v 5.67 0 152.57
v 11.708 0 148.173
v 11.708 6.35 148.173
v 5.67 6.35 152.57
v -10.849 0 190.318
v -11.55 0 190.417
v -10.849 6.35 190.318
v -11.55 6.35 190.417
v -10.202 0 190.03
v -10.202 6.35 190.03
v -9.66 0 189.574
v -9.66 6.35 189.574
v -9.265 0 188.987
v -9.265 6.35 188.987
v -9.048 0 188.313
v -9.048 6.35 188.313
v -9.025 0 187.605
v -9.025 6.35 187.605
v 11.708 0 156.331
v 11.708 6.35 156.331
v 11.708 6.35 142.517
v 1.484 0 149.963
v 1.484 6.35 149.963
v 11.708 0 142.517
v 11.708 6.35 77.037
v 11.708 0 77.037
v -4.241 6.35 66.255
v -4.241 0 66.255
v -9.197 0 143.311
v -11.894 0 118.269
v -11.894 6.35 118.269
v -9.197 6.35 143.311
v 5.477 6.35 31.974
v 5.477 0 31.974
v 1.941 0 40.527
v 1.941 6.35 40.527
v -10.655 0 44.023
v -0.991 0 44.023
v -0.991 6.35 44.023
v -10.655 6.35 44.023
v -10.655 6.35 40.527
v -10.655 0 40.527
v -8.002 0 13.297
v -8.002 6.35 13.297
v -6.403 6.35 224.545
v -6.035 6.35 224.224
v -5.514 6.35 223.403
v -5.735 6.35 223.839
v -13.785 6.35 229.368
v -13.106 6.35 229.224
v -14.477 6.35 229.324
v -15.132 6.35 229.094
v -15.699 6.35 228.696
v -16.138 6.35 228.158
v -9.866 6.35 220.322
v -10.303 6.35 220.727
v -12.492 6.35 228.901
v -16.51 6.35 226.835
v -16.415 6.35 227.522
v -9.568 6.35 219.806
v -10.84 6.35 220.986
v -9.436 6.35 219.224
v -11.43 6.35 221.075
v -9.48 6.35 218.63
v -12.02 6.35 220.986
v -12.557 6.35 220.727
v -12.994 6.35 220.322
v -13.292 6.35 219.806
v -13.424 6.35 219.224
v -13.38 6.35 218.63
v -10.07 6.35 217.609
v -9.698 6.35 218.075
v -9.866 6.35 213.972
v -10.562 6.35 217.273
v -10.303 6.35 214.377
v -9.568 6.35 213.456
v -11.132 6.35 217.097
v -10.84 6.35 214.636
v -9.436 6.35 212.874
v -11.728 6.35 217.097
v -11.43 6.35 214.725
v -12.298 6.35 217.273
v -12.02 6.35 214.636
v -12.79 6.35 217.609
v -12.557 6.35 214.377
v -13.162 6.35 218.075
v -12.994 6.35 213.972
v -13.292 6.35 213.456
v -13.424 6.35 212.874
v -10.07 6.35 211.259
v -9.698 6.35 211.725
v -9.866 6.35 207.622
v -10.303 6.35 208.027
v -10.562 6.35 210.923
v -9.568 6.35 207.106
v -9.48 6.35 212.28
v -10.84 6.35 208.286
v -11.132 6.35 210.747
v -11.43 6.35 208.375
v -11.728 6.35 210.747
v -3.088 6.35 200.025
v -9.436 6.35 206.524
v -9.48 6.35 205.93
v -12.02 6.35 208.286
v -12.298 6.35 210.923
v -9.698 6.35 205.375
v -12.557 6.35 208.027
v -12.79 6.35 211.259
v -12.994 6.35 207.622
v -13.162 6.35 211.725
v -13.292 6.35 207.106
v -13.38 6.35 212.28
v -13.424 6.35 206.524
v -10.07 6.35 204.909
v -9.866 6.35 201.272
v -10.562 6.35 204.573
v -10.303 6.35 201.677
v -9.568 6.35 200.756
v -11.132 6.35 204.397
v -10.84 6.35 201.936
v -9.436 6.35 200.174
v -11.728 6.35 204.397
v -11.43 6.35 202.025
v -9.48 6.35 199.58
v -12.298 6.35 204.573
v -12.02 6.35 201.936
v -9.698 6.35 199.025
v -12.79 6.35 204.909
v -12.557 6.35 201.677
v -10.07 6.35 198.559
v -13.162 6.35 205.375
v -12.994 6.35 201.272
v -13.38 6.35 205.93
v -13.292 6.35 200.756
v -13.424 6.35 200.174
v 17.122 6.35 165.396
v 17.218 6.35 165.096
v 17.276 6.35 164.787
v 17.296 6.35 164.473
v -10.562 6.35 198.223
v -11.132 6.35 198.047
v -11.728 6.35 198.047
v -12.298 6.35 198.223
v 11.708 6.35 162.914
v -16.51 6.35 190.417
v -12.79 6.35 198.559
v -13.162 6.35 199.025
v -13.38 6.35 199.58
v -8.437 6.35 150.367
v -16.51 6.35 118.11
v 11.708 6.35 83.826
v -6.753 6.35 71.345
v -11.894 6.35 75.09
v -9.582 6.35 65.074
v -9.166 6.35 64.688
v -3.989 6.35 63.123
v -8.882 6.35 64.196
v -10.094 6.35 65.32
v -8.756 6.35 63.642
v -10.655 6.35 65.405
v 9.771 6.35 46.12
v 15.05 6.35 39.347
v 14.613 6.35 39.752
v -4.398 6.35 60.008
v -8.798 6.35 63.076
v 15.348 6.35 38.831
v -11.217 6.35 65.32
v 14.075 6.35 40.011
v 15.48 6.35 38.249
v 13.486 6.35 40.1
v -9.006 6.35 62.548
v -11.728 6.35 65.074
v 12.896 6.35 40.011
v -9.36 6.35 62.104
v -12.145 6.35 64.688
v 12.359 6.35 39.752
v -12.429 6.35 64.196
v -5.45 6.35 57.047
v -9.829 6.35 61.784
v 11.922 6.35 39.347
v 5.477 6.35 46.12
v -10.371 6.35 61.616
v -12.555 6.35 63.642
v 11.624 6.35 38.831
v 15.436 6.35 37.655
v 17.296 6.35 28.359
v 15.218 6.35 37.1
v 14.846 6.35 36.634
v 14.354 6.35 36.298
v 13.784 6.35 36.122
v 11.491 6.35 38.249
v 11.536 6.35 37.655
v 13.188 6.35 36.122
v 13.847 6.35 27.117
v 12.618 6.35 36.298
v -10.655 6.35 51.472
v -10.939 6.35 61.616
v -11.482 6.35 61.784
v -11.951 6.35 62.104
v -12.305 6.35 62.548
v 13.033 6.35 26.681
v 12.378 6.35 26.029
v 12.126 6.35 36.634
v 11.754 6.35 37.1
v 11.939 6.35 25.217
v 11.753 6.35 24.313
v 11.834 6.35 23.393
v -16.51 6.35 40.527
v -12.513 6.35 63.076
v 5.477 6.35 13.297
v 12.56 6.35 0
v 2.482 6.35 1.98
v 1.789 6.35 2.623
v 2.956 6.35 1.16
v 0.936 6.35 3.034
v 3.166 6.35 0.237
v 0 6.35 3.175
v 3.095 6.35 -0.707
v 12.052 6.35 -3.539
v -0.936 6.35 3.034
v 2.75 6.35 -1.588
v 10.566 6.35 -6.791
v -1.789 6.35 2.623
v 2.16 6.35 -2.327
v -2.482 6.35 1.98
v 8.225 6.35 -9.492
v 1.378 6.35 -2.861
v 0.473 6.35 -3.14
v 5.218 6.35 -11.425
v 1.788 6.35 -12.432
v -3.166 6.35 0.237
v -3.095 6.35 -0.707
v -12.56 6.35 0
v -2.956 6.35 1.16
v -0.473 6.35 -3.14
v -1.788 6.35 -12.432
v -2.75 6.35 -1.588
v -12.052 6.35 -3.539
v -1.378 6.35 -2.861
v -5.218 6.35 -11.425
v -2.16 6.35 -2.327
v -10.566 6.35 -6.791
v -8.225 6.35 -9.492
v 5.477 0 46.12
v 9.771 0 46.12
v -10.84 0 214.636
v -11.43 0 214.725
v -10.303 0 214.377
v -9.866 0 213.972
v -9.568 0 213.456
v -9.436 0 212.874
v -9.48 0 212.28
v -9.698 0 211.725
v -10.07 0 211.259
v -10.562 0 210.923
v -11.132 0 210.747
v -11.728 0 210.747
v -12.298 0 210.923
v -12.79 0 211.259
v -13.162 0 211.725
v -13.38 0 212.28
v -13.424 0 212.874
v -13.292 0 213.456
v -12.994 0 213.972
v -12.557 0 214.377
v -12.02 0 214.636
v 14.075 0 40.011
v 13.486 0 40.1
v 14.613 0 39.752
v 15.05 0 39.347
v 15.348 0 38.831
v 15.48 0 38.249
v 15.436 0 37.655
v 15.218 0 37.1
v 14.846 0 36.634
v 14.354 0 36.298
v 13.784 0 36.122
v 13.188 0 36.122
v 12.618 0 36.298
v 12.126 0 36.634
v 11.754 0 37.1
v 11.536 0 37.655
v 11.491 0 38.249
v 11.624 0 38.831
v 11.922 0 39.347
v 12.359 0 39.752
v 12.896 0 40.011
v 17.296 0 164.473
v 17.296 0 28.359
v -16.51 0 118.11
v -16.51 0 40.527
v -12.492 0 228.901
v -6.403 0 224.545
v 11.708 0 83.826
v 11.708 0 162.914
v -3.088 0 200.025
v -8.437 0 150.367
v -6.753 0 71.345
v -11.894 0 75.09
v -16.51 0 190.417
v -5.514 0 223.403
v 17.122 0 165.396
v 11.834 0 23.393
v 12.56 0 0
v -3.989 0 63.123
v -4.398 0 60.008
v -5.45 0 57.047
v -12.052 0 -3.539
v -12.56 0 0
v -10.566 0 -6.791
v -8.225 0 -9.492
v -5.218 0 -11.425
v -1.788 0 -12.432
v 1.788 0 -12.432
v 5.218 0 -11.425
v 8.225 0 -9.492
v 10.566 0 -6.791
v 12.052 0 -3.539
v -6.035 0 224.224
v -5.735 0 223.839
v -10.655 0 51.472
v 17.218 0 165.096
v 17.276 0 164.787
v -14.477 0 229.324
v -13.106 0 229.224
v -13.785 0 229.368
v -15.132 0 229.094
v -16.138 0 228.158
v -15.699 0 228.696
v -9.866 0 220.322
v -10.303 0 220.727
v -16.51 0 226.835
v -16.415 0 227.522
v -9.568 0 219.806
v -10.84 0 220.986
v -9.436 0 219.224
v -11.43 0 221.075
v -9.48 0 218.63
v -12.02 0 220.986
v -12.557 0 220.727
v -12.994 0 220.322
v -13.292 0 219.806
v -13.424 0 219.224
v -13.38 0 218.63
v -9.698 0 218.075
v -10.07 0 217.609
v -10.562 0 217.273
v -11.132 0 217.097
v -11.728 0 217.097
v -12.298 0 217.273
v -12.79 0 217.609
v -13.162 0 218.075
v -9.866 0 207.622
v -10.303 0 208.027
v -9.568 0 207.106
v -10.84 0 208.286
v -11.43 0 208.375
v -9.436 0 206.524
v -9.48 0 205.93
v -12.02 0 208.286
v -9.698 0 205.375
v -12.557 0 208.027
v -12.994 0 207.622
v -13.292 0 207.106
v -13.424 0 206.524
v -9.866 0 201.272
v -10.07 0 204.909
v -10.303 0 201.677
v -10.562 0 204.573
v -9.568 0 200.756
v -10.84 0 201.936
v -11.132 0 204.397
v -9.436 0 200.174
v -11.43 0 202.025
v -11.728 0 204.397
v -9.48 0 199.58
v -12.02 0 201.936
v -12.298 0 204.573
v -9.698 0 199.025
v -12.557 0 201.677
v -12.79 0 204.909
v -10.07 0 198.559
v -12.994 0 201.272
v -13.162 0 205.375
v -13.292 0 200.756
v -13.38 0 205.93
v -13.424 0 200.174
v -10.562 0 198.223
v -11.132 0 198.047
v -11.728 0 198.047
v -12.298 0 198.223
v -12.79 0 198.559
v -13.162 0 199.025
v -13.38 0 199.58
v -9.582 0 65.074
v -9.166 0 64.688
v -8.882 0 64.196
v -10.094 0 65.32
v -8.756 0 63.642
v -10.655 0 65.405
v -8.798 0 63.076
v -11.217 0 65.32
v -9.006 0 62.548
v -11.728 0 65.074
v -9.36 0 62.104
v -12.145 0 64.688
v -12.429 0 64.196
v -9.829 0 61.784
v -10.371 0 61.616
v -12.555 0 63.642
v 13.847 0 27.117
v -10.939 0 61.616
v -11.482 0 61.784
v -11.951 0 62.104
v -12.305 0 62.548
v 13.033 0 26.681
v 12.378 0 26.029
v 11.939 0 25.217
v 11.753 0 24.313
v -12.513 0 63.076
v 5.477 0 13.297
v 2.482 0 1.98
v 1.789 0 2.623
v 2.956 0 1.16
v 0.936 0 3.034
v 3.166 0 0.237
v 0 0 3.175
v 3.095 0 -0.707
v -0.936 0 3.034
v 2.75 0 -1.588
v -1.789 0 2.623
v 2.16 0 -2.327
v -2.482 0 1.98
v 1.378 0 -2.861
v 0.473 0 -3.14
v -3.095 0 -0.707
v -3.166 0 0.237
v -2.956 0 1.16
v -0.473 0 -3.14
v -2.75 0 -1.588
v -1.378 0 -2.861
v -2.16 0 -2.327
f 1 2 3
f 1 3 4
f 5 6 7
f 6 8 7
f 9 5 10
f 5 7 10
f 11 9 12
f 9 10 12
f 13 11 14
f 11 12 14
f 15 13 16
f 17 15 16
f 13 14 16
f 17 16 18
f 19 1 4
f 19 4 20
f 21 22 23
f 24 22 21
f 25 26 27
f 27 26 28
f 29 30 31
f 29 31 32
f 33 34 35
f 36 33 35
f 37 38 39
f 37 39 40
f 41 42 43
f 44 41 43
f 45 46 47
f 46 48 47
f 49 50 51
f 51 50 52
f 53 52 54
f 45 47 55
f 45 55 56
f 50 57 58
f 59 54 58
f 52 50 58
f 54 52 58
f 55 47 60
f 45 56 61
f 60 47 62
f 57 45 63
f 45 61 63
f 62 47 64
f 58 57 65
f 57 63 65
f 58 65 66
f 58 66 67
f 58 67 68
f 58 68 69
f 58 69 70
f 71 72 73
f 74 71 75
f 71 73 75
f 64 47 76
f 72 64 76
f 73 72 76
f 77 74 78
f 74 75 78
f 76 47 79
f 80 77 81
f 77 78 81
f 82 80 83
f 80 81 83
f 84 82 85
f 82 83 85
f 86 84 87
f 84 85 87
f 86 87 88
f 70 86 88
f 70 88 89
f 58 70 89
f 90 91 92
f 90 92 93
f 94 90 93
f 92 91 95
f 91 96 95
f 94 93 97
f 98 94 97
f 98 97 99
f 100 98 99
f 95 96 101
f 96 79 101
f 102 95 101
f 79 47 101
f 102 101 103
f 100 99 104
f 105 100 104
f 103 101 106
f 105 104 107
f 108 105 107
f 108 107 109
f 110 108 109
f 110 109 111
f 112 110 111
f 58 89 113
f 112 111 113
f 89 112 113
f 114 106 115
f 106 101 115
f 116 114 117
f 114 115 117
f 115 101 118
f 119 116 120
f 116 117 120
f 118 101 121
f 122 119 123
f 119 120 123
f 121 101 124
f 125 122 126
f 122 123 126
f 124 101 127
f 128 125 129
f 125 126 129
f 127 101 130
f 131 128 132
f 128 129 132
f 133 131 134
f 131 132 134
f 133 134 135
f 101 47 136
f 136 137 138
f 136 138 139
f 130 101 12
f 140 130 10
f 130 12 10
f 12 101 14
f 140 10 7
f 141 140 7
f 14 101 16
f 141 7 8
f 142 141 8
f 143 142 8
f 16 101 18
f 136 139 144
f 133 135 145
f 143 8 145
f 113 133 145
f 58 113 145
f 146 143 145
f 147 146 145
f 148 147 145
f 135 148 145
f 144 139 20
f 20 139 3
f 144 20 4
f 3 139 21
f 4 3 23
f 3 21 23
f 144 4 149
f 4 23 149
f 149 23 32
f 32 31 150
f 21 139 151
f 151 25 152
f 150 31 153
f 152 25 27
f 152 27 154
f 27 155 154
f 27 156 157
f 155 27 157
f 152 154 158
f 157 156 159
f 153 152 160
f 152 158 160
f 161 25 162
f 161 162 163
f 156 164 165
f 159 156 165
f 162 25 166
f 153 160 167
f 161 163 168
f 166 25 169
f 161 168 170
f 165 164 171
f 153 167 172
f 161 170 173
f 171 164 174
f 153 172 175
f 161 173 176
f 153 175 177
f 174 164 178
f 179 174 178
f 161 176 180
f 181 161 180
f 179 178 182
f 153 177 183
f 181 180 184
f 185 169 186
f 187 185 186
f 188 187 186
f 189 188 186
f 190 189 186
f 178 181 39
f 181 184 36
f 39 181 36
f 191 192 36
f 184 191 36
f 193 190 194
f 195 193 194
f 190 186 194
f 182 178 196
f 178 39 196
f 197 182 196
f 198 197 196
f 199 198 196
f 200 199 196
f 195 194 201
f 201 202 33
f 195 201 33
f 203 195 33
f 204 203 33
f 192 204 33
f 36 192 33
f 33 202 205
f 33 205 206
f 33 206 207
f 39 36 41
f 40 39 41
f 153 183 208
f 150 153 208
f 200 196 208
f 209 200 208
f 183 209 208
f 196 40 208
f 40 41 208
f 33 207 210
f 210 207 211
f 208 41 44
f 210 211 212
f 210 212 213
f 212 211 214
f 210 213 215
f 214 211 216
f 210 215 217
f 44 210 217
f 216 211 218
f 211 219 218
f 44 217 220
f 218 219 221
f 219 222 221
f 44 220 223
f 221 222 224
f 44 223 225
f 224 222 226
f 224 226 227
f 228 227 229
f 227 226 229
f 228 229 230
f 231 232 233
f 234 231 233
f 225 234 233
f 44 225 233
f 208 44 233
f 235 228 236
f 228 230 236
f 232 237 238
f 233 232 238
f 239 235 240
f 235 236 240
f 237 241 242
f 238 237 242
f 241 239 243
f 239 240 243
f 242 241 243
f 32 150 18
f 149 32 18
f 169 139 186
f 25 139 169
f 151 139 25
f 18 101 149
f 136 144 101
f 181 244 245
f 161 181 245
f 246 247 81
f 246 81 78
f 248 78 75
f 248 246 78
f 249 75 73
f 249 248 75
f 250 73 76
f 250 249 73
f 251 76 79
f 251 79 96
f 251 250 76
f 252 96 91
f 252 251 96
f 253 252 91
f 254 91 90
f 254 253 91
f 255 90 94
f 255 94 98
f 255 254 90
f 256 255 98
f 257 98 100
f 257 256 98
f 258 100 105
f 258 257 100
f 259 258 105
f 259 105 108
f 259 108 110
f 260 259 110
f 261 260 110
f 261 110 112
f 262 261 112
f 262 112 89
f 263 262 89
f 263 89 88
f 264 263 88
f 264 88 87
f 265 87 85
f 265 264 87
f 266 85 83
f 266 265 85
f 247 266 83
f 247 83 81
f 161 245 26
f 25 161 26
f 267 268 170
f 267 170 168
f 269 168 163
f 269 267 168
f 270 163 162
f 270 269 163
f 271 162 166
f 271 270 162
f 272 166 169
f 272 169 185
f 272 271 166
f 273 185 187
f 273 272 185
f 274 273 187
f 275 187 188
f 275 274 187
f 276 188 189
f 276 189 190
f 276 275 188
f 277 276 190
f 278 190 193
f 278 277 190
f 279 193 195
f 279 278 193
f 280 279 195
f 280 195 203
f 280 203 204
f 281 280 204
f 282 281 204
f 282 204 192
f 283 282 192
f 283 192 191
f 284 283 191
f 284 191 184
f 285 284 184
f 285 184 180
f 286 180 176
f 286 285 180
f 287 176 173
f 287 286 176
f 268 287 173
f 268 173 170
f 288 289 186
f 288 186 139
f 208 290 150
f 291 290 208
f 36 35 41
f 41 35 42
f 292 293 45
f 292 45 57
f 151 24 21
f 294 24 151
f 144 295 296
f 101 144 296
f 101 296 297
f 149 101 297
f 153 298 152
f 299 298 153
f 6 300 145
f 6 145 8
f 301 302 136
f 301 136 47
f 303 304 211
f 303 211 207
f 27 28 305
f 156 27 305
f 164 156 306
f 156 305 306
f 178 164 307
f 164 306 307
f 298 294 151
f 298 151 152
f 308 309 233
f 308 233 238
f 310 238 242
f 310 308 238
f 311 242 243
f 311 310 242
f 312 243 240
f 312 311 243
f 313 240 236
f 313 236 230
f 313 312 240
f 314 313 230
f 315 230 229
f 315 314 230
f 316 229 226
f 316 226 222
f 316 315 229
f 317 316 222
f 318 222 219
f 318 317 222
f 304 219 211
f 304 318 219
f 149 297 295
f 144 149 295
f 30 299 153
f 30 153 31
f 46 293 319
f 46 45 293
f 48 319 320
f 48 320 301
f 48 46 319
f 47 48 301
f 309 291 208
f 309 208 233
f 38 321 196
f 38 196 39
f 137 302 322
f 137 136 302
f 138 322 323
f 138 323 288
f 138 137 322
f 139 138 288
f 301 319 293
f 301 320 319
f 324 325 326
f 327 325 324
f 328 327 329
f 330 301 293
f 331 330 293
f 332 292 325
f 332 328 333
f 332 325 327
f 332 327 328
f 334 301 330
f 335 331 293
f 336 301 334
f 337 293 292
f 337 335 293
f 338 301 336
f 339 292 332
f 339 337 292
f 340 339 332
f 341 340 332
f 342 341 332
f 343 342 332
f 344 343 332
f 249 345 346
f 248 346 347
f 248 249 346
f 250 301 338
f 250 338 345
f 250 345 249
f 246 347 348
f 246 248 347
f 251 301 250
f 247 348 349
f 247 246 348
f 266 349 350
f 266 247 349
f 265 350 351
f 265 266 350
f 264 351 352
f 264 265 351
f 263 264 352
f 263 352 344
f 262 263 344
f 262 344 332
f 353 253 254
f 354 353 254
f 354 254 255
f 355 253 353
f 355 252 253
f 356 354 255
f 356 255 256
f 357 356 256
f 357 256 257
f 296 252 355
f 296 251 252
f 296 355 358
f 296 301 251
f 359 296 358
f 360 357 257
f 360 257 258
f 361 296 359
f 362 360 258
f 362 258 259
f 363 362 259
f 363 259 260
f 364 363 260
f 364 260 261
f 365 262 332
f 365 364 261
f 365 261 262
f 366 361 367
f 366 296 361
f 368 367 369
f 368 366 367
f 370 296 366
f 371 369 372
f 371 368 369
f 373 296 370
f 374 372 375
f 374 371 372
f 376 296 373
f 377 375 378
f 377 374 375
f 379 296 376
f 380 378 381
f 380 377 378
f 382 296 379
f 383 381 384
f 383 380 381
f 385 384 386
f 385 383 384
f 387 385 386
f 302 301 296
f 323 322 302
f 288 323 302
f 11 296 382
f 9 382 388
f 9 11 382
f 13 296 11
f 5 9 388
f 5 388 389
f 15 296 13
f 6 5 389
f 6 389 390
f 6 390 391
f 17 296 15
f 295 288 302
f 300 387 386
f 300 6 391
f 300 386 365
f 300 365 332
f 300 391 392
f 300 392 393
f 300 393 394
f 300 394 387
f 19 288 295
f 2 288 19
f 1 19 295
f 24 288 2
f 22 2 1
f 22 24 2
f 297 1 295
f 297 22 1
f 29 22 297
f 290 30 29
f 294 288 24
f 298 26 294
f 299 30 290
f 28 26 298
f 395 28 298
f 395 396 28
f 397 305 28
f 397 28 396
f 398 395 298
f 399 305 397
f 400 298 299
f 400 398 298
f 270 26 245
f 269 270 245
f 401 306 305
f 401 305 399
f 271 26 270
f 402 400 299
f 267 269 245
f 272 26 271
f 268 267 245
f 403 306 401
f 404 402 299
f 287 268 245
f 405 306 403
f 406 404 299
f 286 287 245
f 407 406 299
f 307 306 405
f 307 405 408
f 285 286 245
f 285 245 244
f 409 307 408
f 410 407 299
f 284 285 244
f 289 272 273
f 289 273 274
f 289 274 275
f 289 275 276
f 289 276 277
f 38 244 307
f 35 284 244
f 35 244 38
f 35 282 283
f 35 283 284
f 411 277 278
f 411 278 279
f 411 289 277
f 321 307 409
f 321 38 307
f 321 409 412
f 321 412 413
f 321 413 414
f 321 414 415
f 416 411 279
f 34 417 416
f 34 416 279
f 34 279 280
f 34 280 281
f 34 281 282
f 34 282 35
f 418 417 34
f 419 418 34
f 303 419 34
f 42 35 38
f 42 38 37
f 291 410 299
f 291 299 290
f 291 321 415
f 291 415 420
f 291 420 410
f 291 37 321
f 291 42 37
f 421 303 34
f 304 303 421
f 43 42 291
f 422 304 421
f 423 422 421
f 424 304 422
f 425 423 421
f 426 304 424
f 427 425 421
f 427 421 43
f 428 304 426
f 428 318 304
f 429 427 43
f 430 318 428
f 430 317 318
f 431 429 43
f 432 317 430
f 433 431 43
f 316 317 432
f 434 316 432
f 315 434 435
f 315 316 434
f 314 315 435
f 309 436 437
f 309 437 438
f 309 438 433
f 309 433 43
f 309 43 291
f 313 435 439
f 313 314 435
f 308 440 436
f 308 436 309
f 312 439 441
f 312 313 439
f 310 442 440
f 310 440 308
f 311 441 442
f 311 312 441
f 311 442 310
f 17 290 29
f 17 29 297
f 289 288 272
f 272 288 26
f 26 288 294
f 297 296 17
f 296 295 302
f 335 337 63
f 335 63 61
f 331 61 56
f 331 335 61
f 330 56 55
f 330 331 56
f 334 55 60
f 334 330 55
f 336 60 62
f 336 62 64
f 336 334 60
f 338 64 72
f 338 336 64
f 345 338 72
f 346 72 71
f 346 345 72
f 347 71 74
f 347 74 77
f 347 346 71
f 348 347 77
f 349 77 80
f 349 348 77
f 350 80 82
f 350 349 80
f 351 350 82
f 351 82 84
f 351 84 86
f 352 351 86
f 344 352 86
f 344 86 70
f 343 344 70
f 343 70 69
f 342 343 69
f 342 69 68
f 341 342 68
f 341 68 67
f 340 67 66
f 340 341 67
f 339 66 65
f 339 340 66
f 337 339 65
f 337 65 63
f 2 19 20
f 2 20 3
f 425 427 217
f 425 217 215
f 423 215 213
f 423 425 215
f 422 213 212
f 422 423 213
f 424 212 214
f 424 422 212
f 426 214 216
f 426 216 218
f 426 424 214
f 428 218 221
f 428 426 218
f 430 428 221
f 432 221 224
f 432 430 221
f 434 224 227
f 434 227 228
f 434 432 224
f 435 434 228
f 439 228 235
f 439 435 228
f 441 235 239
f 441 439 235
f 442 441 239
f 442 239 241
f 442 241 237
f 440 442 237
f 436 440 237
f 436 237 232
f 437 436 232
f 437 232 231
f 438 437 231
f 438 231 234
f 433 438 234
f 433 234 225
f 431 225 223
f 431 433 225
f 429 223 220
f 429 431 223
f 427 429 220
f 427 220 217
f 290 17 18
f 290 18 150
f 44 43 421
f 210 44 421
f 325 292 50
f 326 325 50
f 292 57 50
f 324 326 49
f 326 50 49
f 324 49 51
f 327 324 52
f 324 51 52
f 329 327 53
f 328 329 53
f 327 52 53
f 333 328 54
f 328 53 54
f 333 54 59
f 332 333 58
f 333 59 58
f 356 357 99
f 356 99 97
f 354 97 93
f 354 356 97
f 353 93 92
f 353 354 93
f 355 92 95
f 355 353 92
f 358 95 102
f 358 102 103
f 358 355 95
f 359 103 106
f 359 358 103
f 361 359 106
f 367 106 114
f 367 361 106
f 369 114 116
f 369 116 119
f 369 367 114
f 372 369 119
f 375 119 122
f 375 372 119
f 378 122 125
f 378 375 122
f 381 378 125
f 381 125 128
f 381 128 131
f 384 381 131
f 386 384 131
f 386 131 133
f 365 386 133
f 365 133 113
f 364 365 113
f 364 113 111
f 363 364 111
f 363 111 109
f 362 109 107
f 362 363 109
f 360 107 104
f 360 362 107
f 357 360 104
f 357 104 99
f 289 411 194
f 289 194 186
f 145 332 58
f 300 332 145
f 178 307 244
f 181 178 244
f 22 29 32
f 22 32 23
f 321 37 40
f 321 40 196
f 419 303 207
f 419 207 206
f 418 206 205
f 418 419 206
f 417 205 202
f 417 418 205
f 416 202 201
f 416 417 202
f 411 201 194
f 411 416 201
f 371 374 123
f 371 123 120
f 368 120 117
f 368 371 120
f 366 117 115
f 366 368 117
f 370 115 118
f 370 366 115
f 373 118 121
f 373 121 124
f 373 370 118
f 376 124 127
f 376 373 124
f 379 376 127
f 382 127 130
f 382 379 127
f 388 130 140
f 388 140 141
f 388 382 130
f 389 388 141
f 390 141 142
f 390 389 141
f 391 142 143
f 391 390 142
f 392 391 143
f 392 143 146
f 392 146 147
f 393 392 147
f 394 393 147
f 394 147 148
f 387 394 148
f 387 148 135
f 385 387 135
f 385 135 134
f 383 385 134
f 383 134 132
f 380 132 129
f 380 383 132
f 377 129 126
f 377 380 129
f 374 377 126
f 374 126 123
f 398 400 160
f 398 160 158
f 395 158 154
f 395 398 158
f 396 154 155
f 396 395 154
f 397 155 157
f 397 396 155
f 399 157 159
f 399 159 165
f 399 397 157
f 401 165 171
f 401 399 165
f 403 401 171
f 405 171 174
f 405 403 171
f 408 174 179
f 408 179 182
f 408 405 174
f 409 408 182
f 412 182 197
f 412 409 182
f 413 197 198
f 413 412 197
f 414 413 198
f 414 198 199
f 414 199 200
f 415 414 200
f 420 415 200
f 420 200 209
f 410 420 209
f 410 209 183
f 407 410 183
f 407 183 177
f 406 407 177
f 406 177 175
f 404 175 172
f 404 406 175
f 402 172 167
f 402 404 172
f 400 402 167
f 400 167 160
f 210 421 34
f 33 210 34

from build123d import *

# Parameters (mm, degrees)
SKETCH2_R           = 3.175
SKETCH2_R_2         = 2
SKETCH2_R_3         = 1.905
SKETCH2_R_4         = 1.999999991
BOSS_EXTRUDE1_DEPTH = 6.35
FILLET2_R           = 2.54
FILLET3_R           = 2.54
FILLET4_R           = 2.54
FILLET5_R           = 2.54


with BuildPart() as part:
    # Sketch2 → Boss-Extrude1 (new body)
    with BuildSketch(Plane(origin=(0, 0, 0), x_dir=(1, 0, 0), z_dir=(0, 1, 0))):
        with BuildLine():
            Line((13.846627418, -27.11715969), (17.295902343, -28.359470371))
            Line((17.295902343, -28.359470371), (17.295902343, -164.950770806))
            Line((17.295902343, -164.950770806), (-5.788689103, -224.106088723))
            Line((-5.788689103, -224.106088723), (-16.51, -231.775))
            Line((-16.51, -231.775), (-16.51, -190.41700733))
            Line((-16.51, -190.41700733), (-8.721771923, -190.41700733))
            Line((-8.721771923, -190.41700733), (-16.51, -118.11))
            Line((-16.51, -118.11), (-16.51, -40.527182032))
            Line((-16.51, -40.527182032), (-12.5603, 0))
            ThreePointArc((-12.5603, 0), (0, 12.5603), (12.5603, 0))
            Line((12.5603, 0), (11.834308479, -23.392641285))
            ThreePointArc((11.834308479, -23.392641285), (12.129138804, -25.639224299), (13.846627418, -27.11715969))
        make_face()
        with Locations(Location((0, 0, 0), (0, 0, 270))):
            Circle(SKETCH2_R, mode=Mode.SUBTRACT)
        with Locations(Location((-11.43, -219.075, 0), (0, 0, 270))):
            Circle(SKETCH2_R_2, mode=Mode.SUBTRACT)
        with Locations(Location((-11.43, -212.725, 0), (0, 0, 270))):
            Circle(SKETCH2_R_2, mode=Mode.SUBTRACT)
        with Locations(Location((-11.43, -206.375, 0), (0, 0, 270))):
            Circle(SKETCH2_R_2, mode=Mode.SUBTRACT)
        with Locations(Location((-11.43, -200.025, 0), (0, 0, 270))):
            Circle(SKETCH2_R_2, mode=Mode.SUBTRACT)
        with Locations(Location((-10.6553, -63.5, 0), (0, 0, 270))):
            Circle(SKETCH2_R_3, mode=Mode.SUBTRACT)
        with Locations(Location((13.485902343, -38.1, 0), (0, 0, 270))):
            Circle(SKETCH2_R_4, mode=Mode.SUBTRACT)
        Polygon((-3.088444979, -200.025), (-8.437091633, -150.367410486), (11.707902343, -162.914359455), align=None, mode=Mode.SUBTRACT)
        Polygon((5.669829362, -152.570430441), (11.707902343, -156.331136136), (11.707902343, -148.173239335), align=None, mode=Mode.SUBTRACT)
        Polygon((-9.197164207, -143.310789567), (1.48362655, -149.963128939), (11.707902343, -142.517360277), (11.707902343, -83.82613362), (-6.752611098, -71.345410911), (-11.894481361, -75.089947663), (-11.894481361, -118.268516882), align=None, mode=Mode.SUBTRACT)
        with BuildLine():
            Line((-5.45038708, -57.047318199), (5.477174601, -46.119756518))
            Line((5.477174601, -46.119756518), (9.770631453, -46.119756518))
            Line((9.770631453, -46.119756518), (11.707902343, -77.037423395))
            Line((11.707902343, -77.037423395), (-4.240626345, -66.254995008))
            ThreePointArc((-4.240626345, -66.254995008), (-4.111536449, -61.554723114), (-5.45038708, -57.047318199))
        make_face(mode=Mode.SUBTRACT)
        Polygon((-5.48107582, -40.527182032), (-10.6553, -40.527182032), (-8.00152211, -13.297230483), (5.477174601, -13.297230483), (5.477174601, -31.974105906), (1.94113758, -40.527182032), align=None, mode=Mode.SUBTRACT)
        Polygon((-10.6553, -44.022777243), (-10.6553, -51.472145687), (-0.991335505, -44.022777243), align=None, mode=Mode.SUBTRACT)
    extrude(amount=BOSS_EXTRUDE1_DEPTH)

    # Fillet2
    fillet2_edges = [part.edges().sort_by_distance(p)[0] for p in [
        (-8.721771923, 3.175, 190.41700733),
    ]]
    fillet(fillet2_edges, radius=FILLET2_R)

    # Fillet3
    fillet3_edges = [part.edges().sort_by_distance(p)[0] for p in [
        (-5.788689103, 3.175, 224.106088723),
    ]]
    fillet(fillet3_edges, radius=FILLET3_R)

    # Fillet4
    fillet4_edges = [part.edges().sort_by_distance(p)[0] for p in [
        (-16.51, 3.175, 231.775),
    ]]
    fillet(fillet4_edges, radius=FILLET4_R)

    # Fillet5
    fillet5_edges = [part.edges().sort_by_distance(p)[0] for p in [
        (17.295902343, 3.175, 164.950770806),
    ]]
    fillet(fillet5_edges, radius=FILLET5_R)


solid = part.part
